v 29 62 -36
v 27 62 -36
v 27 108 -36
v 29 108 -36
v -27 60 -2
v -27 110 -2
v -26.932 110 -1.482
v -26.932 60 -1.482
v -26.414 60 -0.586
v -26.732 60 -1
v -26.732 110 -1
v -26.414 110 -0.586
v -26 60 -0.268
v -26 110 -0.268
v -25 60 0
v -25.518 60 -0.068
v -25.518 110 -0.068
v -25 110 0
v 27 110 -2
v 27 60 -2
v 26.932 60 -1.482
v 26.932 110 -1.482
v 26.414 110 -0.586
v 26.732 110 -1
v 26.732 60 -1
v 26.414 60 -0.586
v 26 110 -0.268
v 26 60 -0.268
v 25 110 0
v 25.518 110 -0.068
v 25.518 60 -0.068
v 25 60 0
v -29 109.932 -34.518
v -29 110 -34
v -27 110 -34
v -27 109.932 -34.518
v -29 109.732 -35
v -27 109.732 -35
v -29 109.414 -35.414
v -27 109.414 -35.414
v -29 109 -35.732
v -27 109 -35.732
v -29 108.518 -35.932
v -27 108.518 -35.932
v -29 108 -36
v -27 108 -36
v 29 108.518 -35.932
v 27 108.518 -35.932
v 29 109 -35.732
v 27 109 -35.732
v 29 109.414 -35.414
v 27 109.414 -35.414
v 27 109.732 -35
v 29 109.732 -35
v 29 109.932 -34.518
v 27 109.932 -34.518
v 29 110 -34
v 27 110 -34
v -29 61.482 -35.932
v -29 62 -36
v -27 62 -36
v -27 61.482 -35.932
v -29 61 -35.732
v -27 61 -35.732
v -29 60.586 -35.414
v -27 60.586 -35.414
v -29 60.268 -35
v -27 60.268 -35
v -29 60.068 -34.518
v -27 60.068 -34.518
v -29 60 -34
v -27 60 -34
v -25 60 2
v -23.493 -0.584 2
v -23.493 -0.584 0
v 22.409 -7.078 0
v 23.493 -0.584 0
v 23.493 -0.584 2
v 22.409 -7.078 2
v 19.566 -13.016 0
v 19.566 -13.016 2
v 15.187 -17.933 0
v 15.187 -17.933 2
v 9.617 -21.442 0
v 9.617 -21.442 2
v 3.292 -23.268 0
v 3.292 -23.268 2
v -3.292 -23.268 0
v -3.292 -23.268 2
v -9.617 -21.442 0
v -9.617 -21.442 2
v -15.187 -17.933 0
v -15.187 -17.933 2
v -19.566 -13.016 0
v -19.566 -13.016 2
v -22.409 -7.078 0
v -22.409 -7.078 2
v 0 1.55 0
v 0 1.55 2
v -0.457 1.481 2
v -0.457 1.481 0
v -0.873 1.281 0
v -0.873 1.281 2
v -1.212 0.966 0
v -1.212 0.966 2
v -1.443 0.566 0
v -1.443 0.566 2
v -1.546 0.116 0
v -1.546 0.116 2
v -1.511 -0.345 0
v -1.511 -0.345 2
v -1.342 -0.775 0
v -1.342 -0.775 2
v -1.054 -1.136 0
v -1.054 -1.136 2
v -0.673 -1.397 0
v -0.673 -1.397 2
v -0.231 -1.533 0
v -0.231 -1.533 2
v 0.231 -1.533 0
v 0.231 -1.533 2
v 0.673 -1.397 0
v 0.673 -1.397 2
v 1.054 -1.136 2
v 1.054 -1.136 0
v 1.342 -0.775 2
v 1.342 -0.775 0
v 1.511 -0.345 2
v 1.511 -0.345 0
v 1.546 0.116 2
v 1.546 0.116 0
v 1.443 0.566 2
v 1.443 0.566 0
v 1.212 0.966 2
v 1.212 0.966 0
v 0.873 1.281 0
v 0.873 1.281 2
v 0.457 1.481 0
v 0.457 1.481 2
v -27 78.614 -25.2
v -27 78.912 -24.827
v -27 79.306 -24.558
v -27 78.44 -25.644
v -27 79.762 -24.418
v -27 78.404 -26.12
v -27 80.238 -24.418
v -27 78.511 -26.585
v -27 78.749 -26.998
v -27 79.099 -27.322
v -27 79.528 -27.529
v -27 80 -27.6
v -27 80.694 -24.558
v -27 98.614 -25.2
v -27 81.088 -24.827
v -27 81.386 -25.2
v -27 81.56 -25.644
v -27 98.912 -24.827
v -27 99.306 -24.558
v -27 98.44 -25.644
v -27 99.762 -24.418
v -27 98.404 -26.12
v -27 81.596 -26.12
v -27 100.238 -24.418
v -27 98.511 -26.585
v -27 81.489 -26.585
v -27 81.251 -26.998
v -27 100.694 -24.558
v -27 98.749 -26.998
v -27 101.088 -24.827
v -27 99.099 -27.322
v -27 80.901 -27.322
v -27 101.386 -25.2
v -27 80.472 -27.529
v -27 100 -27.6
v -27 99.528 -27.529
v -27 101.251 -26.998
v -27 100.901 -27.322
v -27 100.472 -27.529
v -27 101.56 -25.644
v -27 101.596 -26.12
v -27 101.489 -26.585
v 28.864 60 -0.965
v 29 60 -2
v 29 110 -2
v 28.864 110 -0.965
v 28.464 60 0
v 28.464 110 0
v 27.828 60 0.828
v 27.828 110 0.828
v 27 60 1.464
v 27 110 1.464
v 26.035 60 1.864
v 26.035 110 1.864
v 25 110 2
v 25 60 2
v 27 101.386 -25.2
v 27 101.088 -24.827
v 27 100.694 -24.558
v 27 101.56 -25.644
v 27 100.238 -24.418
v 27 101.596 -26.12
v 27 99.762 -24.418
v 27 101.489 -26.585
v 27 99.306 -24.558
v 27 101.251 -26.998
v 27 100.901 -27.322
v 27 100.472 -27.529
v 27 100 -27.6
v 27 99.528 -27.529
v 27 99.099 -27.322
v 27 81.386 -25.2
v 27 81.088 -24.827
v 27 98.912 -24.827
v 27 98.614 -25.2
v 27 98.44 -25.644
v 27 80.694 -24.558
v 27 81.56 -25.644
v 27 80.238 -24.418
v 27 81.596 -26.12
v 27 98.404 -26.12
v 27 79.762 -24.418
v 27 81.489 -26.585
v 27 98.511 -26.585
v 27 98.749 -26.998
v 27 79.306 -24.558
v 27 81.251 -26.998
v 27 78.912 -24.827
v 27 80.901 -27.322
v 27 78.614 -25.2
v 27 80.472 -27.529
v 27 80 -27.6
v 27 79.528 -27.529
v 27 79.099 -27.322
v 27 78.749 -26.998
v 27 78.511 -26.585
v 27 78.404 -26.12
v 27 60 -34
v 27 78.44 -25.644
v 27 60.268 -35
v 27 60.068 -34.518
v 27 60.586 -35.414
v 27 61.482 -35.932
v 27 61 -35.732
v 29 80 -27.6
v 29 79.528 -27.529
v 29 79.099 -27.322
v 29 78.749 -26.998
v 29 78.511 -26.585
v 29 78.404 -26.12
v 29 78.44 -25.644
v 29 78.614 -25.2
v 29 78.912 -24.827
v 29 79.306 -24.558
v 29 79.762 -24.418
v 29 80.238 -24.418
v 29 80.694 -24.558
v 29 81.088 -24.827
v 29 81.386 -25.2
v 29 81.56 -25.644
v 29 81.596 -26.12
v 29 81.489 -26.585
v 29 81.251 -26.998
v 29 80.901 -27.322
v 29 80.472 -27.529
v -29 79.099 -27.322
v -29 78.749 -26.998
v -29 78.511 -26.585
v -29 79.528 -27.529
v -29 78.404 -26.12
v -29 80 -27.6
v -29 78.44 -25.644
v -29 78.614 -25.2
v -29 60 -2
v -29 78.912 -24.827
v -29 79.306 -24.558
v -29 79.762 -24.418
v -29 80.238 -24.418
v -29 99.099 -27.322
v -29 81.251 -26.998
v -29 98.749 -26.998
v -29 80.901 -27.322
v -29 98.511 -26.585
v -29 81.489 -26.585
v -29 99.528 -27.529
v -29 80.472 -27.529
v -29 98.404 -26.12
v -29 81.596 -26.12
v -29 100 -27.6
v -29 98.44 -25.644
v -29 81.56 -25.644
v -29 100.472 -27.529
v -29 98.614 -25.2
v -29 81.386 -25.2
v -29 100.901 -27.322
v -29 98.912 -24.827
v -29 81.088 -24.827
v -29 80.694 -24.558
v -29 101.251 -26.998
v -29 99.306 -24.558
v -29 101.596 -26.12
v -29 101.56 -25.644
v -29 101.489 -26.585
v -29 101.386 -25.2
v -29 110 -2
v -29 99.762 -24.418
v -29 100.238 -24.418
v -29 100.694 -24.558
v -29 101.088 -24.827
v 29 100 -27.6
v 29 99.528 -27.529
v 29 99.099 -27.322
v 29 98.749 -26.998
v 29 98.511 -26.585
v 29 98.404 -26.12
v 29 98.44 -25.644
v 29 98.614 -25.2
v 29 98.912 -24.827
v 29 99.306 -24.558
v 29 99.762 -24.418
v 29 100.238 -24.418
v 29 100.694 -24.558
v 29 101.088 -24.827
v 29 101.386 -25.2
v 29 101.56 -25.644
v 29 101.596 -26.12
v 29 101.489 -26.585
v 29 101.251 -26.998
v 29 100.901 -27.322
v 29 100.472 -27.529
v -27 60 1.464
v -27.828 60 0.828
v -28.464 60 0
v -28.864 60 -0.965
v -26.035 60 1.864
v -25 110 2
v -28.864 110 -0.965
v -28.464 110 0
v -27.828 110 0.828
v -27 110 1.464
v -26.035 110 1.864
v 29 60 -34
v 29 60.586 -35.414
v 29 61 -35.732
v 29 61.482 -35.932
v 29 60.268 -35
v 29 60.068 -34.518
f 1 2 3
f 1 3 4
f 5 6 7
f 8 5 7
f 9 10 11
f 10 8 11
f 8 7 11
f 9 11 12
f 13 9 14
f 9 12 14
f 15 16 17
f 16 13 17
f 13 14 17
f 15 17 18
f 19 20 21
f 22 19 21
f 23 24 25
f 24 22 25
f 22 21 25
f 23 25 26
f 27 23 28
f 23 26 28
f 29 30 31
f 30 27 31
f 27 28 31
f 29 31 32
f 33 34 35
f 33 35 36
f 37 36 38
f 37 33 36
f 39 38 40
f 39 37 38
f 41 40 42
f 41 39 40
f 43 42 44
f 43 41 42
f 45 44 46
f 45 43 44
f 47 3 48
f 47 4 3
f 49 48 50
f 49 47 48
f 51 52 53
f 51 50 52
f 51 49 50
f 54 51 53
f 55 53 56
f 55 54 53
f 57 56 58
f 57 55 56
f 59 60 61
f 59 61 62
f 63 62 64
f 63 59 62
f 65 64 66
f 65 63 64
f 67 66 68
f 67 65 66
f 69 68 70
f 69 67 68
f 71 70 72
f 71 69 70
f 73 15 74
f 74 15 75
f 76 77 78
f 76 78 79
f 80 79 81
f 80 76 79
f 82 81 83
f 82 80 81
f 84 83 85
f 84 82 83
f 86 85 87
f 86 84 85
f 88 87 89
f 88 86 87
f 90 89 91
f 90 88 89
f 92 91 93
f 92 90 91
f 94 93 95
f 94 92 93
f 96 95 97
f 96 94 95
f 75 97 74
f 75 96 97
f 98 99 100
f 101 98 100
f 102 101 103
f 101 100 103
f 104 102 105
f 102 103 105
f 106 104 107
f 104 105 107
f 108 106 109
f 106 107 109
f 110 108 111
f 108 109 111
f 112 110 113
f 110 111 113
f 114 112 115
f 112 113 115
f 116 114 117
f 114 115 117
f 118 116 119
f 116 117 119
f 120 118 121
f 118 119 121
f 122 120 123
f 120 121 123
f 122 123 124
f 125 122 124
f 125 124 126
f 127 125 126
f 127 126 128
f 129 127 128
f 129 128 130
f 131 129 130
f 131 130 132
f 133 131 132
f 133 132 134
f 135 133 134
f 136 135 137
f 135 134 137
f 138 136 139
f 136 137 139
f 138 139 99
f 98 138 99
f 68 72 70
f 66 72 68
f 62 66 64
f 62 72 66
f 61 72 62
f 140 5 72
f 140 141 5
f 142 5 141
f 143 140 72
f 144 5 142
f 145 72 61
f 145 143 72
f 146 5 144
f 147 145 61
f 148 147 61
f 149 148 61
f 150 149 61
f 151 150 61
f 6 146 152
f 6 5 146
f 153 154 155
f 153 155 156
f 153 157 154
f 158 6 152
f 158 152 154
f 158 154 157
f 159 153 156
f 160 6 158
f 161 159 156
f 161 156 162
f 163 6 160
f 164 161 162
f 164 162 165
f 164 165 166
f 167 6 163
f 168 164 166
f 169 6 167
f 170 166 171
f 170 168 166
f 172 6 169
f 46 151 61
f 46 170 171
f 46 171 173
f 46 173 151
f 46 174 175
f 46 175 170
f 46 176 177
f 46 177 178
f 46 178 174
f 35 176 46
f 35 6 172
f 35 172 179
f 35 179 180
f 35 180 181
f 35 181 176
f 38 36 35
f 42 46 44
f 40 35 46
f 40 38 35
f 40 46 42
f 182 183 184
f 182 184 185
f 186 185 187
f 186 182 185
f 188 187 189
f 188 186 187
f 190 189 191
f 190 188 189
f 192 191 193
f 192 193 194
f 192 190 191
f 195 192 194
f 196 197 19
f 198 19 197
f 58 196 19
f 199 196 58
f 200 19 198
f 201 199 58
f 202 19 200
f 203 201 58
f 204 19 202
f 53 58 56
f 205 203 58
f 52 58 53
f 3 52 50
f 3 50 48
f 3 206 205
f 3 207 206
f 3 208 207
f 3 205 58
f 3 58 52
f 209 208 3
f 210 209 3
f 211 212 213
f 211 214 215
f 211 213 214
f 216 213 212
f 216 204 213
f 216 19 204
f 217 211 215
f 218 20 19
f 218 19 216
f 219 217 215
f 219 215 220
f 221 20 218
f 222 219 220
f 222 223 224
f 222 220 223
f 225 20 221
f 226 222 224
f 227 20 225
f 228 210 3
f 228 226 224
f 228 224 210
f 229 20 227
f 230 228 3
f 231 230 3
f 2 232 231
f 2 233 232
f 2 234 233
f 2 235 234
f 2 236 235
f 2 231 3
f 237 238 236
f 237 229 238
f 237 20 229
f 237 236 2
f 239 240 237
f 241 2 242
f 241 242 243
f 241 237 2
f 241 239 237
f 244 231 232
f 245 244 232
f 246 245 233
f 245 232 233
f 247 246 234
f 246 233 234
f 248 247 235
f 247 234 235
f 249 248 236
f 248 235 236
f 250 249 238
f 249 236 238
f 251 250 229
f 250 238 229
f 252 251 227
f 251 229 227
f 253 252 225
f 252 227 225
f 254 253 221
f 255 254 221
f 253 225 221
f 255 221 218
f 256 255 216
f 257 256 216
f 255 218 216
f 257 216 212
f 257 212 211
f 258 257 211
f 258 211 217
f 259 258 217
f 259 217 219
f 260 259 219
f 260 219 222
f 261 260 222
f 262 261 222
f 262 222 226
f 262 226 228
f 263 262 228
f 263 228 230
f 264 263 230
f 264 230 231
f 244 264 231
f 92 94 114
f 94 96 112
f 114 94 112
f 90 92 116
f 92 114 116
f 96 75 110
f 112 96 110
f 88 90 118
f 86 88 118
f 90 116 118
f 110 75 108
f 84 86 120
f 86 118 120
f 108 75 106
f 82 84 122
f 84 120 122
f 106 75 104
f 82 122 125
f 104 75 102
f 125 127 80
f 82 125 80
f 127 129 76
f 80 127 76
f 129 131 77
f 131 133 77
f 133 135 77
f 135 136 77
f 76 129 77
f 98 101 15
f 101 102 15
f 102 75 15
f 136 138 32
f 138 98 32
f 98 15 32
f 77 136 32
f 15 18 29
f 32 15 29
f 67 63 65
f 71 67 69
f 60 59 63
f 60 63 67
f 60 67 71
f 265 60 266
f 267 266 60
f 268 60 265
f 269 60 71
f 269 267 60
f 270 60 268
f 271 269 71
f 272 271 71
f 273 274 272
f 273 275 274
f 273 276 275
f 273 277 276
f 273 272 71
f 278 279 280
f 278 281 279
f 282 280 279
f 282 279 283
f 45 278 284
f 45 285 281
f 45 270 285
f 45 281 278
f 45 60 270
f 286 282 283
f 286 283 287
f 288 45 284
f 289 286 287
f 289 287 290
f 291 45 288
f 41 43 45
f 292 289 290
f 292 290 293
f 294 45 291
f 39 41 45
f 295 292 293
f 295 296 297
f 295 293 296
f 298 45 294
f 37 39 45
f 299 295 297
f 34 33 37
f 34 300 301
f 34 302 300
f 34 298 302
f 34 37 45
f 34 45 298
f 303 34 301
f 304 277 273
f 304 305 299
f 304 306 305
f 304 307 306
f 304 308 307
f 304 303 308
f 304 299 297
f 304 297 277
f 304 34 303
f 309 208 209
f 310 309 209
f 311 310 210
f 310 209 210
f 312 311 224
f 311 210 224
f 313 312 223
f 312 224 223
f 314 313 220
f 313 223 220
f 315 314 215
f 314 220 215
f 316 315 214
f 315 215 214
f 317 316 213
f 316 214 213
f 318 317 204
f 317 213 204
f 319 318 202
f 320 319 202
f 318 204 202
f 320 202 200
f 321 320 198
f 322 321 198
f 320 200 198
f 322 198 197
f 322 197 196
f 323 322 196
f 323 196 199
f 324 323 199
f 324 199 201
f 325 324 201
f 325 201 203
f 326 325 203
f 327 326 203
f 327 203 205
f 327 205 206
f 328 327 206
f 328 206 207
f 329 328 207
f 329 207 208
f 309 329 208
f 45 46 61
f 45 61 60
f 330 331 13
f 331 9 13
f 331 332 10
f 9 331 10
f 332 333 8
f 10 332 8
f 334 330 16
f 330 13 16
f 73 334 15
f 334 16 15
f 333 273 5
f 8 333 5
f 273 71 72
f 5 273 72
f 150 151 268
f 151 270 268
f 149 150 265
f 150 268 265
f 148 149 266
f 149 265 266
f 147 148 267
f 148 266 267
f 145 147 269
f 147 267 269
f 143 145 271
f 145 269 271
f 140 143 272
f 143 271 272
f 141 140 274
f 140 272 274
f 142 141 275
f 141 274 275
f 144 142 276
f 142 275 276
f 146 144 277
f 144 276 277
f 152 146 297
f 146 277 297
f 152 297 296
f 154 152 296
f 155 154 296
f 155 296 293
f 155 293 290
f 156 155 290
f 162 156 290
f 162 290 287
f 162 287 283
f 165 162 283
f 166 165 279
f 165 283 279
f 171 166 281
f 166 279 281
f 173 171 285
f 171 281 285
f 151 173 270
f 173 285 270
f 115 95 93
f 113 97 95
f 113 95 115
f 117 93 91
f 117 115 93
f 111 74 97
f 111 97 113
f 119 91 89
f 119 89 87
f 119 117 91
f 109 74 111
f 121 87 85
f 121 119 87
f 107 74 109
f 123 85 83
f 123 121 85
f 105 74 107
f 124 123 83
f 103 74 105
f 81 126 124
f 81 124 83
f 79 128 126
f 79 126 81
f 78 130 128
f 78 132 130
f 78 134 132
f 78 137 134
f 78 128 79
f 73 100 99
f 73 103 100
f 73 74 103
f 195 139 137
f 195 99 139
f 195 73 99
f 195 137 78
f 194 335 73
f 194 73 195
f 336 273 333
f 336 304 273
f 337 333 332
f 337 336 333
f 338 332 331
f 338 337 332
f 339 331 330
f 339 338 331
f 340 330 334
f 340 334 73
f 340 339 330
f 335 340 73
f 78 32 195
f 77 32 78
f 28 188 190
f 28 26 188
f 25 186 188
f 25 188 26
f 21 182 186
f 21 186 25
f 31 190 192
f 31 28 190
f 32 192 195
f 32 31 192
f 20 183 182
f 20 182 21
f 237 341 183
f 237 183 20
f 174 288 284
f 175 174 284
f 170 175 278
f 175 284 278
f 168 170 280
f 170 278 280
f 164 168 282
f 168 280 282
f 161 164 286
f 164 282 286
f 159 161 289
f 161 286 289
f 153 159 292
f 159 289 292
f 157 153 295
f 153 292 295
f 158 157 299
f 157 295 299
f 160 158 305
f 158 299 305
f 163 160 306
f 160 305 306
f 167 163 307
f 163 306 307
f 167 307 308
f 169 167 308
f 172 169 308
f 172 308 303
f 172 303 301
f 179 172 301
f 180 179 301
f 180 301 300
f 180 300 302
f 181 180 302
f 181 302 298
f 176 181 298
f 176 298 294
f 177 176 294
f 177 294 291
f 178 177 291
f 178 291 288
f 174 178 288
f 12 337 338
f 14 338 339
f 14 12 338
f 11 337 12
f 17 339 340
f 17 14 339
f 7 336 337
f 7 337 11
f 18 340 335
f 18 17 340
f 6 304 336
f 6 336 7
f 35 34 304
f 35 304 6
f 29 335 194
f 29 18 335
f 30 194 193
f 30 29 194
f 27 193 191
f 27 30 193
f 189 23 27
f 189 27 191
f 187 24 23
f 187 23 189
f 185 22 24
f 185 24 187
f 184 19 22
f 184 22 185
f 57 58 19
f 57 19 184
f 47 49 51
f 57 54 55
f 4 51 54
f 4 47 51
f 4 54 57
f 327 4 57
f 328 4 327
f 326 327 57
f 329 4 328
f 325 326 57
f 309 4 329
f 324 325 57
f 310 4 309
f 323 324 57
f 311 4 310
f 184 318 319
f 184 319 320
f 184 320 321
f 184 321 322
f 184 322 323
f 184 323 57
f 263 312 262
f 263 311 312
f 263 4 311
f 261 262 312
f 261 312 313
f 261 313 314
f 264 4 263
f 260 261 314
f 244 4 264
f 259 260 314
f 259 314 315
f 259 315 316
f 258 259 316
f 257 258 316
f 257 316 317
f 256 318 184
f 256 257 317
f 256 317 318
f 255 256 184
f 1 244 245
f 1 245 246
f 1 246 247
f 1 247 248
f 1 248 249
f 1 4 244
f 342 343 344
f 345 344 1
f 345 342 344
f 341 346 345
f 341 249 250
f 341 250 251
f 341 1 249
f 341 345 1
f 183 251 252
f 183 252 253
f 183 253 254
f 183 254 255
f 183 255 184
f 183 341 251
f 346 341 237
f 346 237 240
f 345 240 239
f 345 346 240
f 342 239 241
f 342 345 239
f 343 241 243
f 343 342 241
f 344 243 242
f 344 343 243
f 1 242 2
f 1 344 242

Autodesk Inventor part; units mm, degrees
ref_plane "YZ Plane" through (0, 0, 0) normal (1, 0, 0) x (0, 1, 0)
ref_plane "XZ Plane" through (0, 0, 0) normal (0, 1, 0) x (-1, 0, 0)
ref_plane "XY Plane" through (0, 0, 0) normal (0, 0, 1) x (1, 0, 0)
sketch "スケッチ1" plane through (0, 0, 0) normal (0, 0, 1) x (1, 0, 0)
  circle A0 centre (0, 0) radius 23.5
  line L0 (0, 0) -> (0, 60)
  line L1 (0, 60) -> (25, 60)
  line L2 (25, 60) -> (25, 110)
  line L3 (25, 110) -> (0, 110)
  line L4 (0, 110) -> (0, 60)
  line L5 (25, 60) -> (23.4927, -0.5845)
  line L6 (0, 60) -> (-25, 60)
  line L7 (-25, 60) -> (-25, 110)
  line L8 (-25, 110) -> (0, 110)
  line L9 (-25, 60) -> (-23.4927, -0.5845)
  point P0 (-23.4927, -0.5845)
  dimension "d0" = 47
  dimension "d1" = 60
  dimension "d2" = 50
  dimension "d3" = 25
extrude "プレート1" add sketch "スケッチ1" along normal blind 2
sketch "スケッチ2" plane through (27, 60, -2) normal (1, 0, 0) x (0, 1, 0)
  line L0 (50, 0) -> (0, 0)
  line L1 (0, 0) -> (0, -34)
  line L2 (0, -34) -> (50, -34)
  line L3 (50, -34) -> (50, 0)
edge flange "フランジ1" height 38 angle 90 thickness 2 bend radius 2 thickness toward (1, 0, 0) relief tear relief width 2 relief depth 1 edges at (25, 85, 0) wall of the first edge with corners at (27, 110, -2) (27, 60, -2) (27, 60, -36) (27, 110, -36)
bend "曲げ1"
corner "コーナー1"
sketch "スケッチ3" plane through (-27, 110, -2) normal (-1, 0, 0) x (0, -1, 0)
  line L0 (50, 0) -> (0, 0)
  line L1 (0, 0) -> (0, -34)
  line L2 (0, -34) -> (50, -34)
  line L3 (50, -34) -> (50, 0)
edge flange "フランジ2" height 38 angle 90 thickness 2 bend radius 2 thickness toward (-1, 0, 0) relief tear relief width 2 relief depth 1 edges at (-25, 85, 0) wall of the first edge with corners at (-27, 60, -2) (-27, 110, -2) (-27, 110, -36) (-27, 60, -36)
bend "曲げ2"
corner "コーナー2"
sketch "スケッチ4" plane through (0, 0, 2) normal (0, 0, 1) x (1, 0, 0)
  circle A0 centre (0, 0) radius 10.1
  dimension "d25" = 20.2
extrude "押し出し1" [suppressed]
sketch "スケッチ5" plane through (0, 0, 2) normal (0, 0, 1) x (1, 0, 0)
  circle A0 centre (0, 0) radius 15.18
  point P0 (0, 15.18)
  point P1 (-13.1463, 7.59)
  point P2 (-13.1463, -7.59)
  point P3 (0, -15.18)
  point P4 (13.1463, -7.59)
  point P5 (13.1463, 7.59)
  dimension "d28" = 30.36
  dimension "d31" = 360
hole "穴1" [suppressed]
sketch "スケッチ6" plane through (29, 60, -36) normal (1, 0, 0) x (0, 0, -1)
  line L0 (0, 0) -> (0, 50) projected
  line L1 (0, 10) -> (-34, 10)
  line L2 (-34, 50) -> (-34, 0) projected
  line L3 (0, 0) -> (-34, 0) projected
  line L4 (0, 50) -> (-34, 50) projected
  line L5 (-10, 50) -> (-10, 10)
  point P0 (-36, -60)
  point P1 (-10, 20)
  point P2 (-10, 40)
  point P3 (-36, 50)
  dimension "d40" = 10
  dimension "d42" = 10
  dimension "d43" = 20
  dimension "d69" = 26
hole "穴2" at (29, 80, -26) at (29, 100, -26) direction (-1, 0, 0) diameter 3.2 end through all
sketch "スケッチ7" plane through (0, 0, 0) normal (0, 0, -1) x (-1, 0, 0)
  point P0 (0, 0)
  point P1 (0, 0)
hole "穴3" at (0, 0, 0) direction (0, 0, 1) diameter 3.1 end through all
sketch "スケッチ8" plane through (0, 0, 2) normal (0, 0, 1) x (1, 0, 0)
  line L0 (-15, 100) -> (15, 100)
  line L1 (15, 100) -> (15, 60)
  line L2 (15, 60) -> (-15, 60)
  line L3 (-15, 60) -> (-15, 100)
  line L4 (25, 110) -> (25, 60) projected
  line L5 (-25, 60) -> (-25, 110) projected
  line L6 (-25, 110) -> (25, 110) projected
  circle A0 centre (0, 0) radius 1.55 projected
  circle A1 centre (0, 0) radius 13.5
  line L7 (-14.4993, 40) -> (-13.4958, -0.3358)
  line L8 (-23.4927, -0.5845) -> (-25, 60) projected
  line L9 (13.4958, -0.3358) -> (14.4993, 40)
  line L10 (25, 60) -> (23.4927, -0.5845) projected
  line L11 (14.4993, 40) -> (-14.4993, 40)
  dimension "d58" = 10
  dimension "d59" = 10
  dimension "d60" = 10
  dimension "d61" = 40
  dimension "d63" = 10
  dimension "d64" = 20
extrude "押し出し2" [suppressed]
fillet "フィレット1" [suppressed]
fillet "フィレット2" radius 2 4 edges at (28, 60, -36) (28, 110, -36) (-28, 110, -36) (-28, 60, -36)
equation "\"d38\" = Thickness"
equation "\"d56\" = Thickness"
equation "\"d4\" = Thickness"
equation "\"d5\" = BendReliefWidth"
equation "\"d6\" = BendReliefDepth"
equation "\"d7\" = MinimumRemnant"
equation "\"d8\" = TransitionRadius"
equation "\"d11\" = BendRadius"
equation "\"d12\" = CornerReliefSize"
equation "\"d13\" = GapSize"
equation "\"d14\" = JacobiRadiusSize"
equation "\"d15\" = BendReliefWidth"
equation "\"d16\" = BendReliefDepth"
equation "\"d17\" = MinimumRemnant"
equation "\"d18\" = TransitionRadius"
equation "\"d21\" = BendRadius"
equation "\"d22\" = CornerReliefSize"
equation "\"d23\" = GapSize"
equation "\"d24\" = JacobiRadiusSize"
equation "\"BendRadius\" = Thickness"
equation "\"BendReliefWidth\" = Thickness"
equation "\"BendReliefDepth\" = 0.5 * Thickness"
equation "\"CornerReliefSize\" = 4 * Thickness"
equation "\"MinimumRemnant\" = 2 * Thickness"
equation "\"TransitionRadius\" = BendRadius"
equation "\"JacobiRadiusSize\" = BendRadius"
equation "\"GapSize\" = Thickness"
equation "\"Thickness\" = 2"
properties part number "servoplate2_forR3" material "アルミニウム 6061"
